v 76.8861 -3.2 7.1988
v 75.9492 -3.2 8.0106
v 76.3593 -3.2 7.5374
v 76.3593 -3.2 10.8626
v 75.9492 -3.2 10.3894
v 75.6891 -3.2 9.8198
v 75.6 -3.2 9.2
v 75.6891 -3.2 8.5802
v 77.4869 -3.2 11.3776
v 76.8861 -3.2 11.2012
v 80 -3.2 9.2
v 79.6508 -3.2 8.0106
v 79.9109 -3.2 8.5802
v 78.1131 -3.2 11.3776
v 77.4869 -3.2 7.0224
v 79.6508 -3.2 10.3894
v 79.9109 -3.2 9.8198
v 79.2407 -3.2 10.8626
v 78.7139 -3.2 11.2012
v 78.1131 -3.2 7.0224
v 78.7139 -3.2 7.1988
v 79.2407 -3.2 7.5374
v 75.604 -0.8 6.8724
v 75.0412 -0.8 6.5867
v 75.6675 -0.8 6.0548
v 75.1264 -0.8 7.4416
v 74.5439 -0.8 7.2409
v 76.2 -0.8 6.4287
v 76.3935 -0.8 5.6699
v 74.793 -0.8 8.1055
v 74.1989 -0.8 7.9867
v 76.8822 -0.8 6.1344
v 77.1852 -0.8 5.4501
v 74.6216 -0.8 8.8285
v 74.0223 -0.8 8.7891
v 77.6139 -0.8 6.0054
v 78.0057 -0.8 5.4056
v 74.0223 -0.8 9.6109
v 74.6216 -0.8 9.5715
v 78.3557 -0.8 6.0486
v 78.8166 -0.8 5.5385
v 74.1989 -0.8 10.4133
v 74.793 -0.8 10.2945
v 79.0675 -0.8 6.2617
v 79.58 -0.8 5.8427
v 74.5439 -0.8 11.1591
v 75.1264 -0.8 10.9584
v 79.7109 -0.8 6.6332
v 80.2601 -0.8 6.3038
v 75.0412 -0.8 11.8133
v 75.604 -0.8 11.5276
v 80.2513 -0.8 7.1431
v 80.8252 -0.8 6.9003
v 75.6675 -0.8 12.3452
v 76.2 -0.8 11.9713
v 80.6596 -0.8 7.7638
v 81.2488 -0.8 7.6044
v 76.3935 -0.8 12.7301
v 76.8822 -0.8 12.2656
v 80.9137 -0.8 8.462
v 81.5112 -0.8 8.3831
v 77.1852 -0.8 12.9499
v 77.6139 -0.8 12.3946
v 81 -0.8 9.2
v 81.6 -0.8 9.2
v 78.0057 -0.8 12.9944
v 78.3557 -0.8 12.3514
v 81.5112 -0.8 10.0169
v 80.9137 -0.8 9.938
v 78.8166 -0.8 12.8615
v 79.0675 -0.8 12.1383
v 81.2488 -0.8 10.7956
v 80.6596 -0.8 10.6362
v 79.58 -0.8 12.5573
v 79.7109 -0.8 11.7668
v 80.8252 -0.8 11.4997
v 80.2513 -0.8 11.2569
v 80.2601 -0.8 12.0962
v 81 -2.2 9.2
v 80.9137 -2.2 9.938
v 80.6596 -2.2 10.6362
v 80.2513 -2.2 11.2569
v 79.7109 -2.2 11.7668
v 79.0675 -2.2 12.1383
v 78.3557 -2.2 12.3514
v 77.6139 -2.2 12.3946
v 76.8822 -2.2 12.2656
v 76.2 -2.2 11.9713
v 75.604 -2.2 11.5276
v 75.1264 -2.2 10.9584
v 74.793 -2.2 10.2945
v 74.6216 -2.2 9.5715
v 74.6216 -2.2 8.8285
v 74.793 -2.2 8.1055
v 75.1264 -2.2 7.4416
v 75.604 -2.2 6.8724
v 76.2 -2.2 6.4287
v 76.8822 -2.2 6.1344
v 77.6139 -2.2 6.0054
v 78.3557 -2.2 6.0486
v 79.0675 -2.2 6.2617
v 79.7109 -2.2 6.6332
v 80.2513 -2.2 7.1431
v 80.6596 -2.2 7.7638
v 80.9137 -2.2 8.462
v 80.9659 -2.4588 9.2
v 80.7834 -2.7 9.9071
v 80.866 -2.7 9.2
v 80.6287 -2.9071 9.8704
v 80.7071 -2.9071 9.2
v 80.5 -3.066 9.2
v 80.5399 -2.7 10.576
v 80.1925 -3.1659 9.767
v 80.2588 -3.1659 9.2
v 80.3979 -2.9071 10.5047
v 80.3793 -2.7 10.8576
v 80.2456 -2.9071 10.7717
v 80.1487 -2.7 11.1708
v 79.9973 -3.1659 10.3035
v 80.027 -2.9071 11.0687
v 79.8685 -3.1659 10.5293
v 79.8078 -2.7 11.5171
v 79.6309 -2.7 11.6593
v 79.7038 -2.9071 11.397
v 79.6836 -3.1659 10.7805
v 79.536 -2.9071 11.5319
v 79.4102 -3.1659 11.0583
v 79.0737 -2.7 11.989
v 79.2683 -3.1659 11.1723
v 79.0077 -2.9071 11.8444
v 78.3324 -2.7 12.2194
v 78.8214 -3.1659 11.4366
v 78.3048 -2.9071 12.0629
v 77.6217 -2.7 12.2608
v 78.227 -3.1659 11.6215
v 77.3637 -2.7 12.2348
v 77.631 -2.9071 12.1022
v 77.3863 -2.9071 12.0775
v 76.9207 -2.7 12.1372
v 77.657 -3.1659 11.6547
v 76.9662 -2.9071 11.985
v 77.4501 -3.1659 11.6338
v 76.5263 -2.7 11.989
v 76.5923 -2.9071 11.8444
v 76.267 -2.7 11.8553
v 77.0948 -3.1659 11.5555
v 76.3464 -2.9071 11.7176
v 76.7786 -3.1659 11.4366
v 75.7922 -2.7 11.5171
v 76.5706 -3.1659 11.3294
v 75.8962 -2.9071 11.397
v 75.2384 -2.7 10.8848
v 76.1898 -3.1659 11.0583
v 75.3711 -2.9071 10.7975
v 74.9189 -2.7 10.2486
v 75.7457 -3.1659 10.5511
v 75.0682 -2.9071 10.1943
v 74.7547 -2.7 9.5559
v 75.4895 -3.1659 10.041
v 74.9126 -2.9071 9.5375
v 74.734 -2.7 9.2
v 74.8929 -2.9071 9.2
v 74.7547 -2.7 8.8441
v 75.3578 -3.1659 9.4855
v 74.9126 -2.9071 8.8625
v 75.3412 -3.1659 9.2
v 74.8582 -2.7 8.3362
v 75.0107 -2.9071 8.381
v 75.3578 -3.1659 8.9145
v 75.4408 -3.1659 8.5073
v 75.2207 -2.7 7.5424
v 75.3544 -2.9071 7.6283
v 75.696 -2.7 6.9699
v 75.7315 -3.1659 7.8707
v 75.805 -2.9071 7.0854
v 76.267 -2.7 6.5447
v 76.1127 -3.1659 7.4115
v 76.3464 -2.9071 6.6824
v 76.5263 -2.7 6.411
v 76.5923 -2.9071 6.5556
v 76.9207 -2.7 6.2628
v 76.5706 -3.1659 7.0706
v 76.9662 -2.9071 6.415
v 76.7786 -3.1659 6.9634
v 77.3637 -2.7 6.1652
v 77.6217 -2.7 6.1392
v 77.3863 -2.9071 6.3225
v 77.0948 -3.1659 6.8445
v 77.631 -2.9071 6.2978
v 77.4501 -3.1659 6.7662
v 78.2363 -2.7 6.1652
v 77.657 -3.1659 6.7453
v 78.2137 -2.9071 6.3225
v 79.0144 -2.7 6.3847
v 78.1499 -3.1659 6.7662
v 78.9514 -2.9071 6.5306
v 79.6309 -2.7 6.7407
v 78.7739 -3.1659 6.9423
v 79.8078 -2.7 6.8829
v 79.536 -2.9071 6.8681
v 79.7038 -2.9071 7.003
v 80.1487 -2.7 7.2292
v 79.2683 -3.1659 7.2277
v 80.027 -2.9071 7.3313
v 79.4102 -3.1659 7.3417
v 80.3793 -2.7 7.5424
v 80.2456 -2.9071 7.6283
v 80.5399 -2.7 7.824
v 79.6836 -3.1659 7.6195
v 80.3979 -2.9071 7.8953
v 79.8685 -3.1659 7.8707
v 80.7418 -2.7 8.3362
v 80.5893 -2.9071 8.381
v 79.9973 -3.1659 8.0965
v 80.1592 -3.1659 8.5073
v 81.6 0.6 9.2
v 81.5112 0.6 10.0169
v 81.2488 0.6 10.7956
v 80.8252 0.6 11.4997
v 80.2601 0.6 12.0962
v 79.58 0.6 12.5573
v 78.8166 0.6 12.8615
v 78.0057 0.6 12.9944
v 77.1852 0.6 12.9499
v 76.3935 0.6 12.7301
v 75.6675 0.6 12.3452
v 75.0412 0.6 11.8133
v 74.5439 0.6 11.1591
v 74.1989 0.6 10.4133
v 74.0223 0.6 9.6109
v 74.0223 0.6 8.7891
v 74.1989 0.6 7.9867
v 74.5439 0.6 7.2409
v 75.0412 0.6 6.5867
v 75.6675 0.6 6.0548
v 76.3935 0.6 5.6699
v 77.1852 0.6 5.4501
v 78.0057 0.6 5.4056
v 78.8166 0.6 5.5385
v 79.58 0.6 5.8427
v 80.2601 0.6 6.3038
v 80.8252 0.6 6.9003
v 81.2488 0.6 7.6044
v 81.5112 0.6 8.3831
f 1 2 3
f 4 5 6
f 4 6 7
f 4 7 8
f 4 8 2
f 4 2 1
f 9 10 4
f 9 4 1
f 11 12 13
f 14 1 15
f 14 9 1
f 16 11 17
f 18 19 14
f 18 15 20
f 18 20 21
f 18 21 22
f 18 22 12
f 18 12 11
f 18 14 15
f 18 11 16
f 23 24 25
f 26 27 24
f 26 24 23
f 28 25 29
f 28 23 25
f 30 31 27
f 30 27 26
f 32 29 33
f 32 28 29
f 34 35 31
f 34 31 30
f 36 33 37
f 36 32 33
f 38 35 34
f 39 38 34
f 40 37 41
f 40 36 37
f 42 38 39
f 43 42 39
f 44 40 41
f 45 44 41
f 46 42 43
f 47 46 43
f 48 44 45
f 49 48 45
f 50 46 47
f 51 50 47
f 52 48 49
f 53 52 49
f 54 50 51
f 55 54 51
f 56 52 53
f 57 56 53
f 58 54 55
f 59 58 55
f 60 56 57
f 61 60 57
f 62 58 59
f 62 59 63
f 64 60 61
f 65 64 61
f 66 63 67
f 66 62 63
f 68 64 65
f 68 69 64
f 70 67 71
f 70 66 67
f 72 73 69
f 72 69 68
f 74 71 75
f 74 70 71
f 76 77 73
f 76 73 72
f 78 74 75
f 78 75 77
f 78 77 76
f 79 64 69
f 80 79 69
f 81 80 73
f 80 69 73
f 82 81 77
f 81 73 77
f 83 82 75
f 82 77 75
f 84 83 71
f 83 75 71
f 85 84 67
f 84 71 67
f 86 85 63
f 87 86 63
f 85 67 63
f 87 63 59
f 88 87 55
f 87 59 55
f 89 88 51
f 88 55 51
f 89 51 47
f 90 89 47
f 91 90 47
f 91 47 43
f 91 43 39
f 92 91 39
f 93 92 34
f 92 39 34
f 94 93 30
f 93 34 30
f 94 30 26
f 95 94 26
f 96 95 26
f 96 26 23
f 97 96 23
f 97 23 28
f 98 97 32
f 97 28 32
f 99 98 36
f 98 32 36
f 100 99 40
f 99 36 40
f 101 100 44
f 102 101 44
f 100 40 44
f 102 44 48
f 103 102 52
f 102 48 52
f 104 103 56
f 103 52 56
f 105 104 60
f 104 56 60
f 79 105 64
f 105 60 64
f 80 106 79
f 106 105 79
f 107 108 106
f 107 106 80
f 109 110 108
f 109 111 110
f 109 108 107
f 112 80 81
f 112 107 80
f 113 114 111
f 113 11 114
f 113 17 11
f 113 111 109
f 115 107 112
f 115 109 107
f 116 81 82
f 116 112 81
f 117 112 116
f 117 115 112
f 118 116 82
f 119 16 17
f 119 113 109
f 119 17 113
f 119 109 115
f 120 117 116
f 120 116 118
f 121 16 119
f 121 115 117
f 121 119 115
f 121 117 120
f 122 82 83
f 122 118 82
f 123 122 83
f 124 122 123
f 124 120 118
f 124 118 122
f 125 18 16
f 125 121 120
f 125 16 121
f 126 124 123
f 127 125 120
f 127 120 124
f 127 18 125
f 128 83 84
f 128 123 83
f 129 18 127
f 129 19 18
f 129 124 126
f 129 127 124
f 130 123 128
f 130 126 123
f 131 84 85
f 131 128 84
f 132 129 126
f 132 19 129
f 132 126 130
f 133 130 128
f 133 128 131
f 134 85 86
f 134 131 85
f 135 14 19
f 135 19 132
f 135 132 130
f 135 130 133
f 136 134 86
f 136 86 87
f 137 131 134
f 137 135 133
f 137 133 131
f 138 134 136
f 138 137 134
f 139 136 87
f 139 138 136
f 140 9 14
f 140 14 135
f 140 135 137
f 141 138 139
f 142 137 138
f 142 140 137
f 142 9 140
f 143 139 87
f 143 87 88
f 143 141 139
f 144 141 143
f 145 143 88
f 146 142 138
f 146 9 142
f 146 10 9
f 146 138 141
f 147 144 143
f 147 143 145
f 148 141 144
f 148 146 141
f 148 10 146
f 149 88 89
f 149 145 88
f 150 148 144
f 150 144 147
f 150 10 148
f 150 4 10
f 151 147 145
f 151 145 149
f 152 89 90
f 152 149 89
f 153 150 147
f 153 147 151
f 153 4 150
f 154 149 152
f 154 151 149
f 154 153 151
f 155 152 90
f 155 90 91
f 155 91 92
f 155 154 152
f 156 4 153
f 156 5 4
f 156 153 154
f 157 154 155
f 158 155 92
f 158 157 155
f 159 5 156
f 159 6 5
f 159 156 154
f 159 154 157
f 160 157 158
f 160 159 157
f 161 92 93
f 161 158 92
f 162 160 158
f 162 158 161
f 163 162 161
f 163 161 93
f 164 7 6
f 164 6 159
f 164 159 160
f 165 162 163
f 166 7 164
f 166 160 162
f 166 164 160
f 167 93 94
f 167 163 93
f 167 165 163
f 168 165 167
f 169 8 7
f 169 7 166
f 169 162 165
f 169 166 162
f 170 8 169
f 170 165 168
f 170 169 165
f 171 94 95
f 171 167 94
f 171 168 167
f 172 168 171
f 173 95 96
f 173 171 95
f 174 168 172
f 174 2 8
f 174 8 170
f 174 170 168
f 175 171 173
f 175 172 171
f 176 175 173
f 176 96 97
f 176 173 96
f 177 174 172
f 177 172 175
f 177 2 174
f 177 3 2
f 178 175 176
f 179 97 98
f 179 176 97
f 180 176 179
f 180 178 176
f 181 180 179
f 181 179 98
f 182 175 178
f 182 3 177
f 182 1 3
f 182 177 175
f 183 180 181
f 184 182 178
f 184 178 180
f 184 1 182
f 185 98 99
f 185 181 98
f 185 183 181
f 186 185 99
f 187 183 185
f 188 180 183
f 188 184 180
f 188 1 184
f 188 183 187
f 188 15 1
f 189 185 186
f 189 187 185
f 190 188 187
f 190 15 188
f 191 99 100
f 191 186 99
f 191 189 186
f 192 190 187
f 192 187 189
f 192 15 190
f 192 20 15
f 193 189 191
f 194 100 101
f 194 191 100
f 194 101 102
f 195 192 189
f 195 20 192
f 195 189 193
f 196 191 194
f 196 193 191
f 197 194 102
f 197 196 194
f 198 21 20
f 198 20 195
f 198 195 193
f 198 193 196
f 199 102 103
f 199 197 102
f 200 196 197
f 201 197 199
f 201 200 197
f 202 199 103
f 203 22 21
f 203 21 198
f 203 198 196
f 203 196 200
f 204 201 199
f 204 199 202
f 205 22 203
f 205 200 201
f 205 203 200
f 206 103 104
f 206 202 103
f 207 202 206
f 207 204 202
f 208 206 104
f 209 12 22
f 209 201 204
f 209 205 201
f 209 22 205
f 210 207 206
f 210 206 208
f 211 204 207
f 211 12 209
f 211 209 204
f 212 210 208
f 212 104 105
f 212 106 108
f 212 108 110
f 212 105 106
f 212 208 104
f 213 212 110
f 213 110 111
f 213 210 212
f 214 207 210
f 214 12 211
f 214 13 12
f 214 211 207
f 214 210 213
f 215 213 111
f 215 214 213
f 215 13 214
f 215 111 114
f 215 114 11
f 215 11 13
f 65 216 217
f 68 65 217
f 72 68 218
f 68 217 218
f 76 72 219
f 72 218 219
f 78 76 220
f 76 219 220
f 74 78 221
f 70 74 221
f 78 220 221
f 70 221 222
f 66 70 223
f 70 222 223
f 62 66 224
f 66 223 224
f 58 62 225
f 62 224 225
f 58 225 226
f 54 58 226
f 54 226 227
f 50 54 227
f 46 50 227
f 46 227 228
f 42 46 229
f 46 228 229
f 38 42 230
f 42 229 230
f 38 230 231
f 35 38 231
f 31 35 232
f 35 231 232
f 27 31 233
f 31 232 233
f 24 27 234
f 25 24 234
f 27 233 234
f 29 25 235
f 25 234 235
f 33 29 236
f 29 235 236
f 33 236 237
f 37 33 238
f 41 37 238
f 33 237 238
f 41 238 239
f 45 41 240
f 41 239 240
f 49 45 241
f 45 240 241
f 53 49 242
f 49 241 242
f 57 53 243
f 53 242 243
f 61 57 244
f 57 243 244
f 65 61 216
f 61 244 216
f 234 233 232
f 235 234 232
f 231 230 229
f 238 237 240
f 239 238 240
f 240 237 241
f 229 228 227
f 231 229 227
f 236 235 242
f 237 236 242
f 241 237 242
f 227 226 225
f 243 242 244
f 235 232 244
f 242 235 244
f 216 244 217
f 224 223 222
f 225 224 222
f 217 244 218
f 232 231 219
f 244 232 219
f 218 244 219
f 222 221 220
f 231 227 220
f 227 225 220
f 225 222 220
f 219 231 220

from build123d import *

# Parameters (mm, degrees)
SKETCH043_R  = 3.8
PAD017_DEPTH = 1.4
SKETCH044_R  = 3.2
PAD018_DEPTH = 2.4
FILLET017_R  = 1


with BuildPart() as part:
    # Sketch043 → Pad017 (new body)
    with BuildSketch(Plane.XZ):
        with Locations((28.8, 9.2)):
            Circle(SKETCH043_R)
    extrude(amount=PAD017_DEPTH)

    # Sketch044 (on Face3 of Pad017) → Pad018 (join)
    with BuildSketch(Plane.XZ.offset(1.4)):
        with Locations((28.8, 9.2)):
            Circle(SKETCH044_R)
    extrude(amount=PAD018_DEPTH)

    # Fillet017
    fillet017_edges = [part.edges().sort_by_distance(p)[0] for p in [
        (25.6, -3.8, 9.2),
    ]]
    fillet(fillet017_edges, radius=FILLET017_R)


with BuildPart() as part_1:
    # Body005 placement: moved
    add(part.part.moved(Location((49, 0.6, 0))))


solid = part_1.part
